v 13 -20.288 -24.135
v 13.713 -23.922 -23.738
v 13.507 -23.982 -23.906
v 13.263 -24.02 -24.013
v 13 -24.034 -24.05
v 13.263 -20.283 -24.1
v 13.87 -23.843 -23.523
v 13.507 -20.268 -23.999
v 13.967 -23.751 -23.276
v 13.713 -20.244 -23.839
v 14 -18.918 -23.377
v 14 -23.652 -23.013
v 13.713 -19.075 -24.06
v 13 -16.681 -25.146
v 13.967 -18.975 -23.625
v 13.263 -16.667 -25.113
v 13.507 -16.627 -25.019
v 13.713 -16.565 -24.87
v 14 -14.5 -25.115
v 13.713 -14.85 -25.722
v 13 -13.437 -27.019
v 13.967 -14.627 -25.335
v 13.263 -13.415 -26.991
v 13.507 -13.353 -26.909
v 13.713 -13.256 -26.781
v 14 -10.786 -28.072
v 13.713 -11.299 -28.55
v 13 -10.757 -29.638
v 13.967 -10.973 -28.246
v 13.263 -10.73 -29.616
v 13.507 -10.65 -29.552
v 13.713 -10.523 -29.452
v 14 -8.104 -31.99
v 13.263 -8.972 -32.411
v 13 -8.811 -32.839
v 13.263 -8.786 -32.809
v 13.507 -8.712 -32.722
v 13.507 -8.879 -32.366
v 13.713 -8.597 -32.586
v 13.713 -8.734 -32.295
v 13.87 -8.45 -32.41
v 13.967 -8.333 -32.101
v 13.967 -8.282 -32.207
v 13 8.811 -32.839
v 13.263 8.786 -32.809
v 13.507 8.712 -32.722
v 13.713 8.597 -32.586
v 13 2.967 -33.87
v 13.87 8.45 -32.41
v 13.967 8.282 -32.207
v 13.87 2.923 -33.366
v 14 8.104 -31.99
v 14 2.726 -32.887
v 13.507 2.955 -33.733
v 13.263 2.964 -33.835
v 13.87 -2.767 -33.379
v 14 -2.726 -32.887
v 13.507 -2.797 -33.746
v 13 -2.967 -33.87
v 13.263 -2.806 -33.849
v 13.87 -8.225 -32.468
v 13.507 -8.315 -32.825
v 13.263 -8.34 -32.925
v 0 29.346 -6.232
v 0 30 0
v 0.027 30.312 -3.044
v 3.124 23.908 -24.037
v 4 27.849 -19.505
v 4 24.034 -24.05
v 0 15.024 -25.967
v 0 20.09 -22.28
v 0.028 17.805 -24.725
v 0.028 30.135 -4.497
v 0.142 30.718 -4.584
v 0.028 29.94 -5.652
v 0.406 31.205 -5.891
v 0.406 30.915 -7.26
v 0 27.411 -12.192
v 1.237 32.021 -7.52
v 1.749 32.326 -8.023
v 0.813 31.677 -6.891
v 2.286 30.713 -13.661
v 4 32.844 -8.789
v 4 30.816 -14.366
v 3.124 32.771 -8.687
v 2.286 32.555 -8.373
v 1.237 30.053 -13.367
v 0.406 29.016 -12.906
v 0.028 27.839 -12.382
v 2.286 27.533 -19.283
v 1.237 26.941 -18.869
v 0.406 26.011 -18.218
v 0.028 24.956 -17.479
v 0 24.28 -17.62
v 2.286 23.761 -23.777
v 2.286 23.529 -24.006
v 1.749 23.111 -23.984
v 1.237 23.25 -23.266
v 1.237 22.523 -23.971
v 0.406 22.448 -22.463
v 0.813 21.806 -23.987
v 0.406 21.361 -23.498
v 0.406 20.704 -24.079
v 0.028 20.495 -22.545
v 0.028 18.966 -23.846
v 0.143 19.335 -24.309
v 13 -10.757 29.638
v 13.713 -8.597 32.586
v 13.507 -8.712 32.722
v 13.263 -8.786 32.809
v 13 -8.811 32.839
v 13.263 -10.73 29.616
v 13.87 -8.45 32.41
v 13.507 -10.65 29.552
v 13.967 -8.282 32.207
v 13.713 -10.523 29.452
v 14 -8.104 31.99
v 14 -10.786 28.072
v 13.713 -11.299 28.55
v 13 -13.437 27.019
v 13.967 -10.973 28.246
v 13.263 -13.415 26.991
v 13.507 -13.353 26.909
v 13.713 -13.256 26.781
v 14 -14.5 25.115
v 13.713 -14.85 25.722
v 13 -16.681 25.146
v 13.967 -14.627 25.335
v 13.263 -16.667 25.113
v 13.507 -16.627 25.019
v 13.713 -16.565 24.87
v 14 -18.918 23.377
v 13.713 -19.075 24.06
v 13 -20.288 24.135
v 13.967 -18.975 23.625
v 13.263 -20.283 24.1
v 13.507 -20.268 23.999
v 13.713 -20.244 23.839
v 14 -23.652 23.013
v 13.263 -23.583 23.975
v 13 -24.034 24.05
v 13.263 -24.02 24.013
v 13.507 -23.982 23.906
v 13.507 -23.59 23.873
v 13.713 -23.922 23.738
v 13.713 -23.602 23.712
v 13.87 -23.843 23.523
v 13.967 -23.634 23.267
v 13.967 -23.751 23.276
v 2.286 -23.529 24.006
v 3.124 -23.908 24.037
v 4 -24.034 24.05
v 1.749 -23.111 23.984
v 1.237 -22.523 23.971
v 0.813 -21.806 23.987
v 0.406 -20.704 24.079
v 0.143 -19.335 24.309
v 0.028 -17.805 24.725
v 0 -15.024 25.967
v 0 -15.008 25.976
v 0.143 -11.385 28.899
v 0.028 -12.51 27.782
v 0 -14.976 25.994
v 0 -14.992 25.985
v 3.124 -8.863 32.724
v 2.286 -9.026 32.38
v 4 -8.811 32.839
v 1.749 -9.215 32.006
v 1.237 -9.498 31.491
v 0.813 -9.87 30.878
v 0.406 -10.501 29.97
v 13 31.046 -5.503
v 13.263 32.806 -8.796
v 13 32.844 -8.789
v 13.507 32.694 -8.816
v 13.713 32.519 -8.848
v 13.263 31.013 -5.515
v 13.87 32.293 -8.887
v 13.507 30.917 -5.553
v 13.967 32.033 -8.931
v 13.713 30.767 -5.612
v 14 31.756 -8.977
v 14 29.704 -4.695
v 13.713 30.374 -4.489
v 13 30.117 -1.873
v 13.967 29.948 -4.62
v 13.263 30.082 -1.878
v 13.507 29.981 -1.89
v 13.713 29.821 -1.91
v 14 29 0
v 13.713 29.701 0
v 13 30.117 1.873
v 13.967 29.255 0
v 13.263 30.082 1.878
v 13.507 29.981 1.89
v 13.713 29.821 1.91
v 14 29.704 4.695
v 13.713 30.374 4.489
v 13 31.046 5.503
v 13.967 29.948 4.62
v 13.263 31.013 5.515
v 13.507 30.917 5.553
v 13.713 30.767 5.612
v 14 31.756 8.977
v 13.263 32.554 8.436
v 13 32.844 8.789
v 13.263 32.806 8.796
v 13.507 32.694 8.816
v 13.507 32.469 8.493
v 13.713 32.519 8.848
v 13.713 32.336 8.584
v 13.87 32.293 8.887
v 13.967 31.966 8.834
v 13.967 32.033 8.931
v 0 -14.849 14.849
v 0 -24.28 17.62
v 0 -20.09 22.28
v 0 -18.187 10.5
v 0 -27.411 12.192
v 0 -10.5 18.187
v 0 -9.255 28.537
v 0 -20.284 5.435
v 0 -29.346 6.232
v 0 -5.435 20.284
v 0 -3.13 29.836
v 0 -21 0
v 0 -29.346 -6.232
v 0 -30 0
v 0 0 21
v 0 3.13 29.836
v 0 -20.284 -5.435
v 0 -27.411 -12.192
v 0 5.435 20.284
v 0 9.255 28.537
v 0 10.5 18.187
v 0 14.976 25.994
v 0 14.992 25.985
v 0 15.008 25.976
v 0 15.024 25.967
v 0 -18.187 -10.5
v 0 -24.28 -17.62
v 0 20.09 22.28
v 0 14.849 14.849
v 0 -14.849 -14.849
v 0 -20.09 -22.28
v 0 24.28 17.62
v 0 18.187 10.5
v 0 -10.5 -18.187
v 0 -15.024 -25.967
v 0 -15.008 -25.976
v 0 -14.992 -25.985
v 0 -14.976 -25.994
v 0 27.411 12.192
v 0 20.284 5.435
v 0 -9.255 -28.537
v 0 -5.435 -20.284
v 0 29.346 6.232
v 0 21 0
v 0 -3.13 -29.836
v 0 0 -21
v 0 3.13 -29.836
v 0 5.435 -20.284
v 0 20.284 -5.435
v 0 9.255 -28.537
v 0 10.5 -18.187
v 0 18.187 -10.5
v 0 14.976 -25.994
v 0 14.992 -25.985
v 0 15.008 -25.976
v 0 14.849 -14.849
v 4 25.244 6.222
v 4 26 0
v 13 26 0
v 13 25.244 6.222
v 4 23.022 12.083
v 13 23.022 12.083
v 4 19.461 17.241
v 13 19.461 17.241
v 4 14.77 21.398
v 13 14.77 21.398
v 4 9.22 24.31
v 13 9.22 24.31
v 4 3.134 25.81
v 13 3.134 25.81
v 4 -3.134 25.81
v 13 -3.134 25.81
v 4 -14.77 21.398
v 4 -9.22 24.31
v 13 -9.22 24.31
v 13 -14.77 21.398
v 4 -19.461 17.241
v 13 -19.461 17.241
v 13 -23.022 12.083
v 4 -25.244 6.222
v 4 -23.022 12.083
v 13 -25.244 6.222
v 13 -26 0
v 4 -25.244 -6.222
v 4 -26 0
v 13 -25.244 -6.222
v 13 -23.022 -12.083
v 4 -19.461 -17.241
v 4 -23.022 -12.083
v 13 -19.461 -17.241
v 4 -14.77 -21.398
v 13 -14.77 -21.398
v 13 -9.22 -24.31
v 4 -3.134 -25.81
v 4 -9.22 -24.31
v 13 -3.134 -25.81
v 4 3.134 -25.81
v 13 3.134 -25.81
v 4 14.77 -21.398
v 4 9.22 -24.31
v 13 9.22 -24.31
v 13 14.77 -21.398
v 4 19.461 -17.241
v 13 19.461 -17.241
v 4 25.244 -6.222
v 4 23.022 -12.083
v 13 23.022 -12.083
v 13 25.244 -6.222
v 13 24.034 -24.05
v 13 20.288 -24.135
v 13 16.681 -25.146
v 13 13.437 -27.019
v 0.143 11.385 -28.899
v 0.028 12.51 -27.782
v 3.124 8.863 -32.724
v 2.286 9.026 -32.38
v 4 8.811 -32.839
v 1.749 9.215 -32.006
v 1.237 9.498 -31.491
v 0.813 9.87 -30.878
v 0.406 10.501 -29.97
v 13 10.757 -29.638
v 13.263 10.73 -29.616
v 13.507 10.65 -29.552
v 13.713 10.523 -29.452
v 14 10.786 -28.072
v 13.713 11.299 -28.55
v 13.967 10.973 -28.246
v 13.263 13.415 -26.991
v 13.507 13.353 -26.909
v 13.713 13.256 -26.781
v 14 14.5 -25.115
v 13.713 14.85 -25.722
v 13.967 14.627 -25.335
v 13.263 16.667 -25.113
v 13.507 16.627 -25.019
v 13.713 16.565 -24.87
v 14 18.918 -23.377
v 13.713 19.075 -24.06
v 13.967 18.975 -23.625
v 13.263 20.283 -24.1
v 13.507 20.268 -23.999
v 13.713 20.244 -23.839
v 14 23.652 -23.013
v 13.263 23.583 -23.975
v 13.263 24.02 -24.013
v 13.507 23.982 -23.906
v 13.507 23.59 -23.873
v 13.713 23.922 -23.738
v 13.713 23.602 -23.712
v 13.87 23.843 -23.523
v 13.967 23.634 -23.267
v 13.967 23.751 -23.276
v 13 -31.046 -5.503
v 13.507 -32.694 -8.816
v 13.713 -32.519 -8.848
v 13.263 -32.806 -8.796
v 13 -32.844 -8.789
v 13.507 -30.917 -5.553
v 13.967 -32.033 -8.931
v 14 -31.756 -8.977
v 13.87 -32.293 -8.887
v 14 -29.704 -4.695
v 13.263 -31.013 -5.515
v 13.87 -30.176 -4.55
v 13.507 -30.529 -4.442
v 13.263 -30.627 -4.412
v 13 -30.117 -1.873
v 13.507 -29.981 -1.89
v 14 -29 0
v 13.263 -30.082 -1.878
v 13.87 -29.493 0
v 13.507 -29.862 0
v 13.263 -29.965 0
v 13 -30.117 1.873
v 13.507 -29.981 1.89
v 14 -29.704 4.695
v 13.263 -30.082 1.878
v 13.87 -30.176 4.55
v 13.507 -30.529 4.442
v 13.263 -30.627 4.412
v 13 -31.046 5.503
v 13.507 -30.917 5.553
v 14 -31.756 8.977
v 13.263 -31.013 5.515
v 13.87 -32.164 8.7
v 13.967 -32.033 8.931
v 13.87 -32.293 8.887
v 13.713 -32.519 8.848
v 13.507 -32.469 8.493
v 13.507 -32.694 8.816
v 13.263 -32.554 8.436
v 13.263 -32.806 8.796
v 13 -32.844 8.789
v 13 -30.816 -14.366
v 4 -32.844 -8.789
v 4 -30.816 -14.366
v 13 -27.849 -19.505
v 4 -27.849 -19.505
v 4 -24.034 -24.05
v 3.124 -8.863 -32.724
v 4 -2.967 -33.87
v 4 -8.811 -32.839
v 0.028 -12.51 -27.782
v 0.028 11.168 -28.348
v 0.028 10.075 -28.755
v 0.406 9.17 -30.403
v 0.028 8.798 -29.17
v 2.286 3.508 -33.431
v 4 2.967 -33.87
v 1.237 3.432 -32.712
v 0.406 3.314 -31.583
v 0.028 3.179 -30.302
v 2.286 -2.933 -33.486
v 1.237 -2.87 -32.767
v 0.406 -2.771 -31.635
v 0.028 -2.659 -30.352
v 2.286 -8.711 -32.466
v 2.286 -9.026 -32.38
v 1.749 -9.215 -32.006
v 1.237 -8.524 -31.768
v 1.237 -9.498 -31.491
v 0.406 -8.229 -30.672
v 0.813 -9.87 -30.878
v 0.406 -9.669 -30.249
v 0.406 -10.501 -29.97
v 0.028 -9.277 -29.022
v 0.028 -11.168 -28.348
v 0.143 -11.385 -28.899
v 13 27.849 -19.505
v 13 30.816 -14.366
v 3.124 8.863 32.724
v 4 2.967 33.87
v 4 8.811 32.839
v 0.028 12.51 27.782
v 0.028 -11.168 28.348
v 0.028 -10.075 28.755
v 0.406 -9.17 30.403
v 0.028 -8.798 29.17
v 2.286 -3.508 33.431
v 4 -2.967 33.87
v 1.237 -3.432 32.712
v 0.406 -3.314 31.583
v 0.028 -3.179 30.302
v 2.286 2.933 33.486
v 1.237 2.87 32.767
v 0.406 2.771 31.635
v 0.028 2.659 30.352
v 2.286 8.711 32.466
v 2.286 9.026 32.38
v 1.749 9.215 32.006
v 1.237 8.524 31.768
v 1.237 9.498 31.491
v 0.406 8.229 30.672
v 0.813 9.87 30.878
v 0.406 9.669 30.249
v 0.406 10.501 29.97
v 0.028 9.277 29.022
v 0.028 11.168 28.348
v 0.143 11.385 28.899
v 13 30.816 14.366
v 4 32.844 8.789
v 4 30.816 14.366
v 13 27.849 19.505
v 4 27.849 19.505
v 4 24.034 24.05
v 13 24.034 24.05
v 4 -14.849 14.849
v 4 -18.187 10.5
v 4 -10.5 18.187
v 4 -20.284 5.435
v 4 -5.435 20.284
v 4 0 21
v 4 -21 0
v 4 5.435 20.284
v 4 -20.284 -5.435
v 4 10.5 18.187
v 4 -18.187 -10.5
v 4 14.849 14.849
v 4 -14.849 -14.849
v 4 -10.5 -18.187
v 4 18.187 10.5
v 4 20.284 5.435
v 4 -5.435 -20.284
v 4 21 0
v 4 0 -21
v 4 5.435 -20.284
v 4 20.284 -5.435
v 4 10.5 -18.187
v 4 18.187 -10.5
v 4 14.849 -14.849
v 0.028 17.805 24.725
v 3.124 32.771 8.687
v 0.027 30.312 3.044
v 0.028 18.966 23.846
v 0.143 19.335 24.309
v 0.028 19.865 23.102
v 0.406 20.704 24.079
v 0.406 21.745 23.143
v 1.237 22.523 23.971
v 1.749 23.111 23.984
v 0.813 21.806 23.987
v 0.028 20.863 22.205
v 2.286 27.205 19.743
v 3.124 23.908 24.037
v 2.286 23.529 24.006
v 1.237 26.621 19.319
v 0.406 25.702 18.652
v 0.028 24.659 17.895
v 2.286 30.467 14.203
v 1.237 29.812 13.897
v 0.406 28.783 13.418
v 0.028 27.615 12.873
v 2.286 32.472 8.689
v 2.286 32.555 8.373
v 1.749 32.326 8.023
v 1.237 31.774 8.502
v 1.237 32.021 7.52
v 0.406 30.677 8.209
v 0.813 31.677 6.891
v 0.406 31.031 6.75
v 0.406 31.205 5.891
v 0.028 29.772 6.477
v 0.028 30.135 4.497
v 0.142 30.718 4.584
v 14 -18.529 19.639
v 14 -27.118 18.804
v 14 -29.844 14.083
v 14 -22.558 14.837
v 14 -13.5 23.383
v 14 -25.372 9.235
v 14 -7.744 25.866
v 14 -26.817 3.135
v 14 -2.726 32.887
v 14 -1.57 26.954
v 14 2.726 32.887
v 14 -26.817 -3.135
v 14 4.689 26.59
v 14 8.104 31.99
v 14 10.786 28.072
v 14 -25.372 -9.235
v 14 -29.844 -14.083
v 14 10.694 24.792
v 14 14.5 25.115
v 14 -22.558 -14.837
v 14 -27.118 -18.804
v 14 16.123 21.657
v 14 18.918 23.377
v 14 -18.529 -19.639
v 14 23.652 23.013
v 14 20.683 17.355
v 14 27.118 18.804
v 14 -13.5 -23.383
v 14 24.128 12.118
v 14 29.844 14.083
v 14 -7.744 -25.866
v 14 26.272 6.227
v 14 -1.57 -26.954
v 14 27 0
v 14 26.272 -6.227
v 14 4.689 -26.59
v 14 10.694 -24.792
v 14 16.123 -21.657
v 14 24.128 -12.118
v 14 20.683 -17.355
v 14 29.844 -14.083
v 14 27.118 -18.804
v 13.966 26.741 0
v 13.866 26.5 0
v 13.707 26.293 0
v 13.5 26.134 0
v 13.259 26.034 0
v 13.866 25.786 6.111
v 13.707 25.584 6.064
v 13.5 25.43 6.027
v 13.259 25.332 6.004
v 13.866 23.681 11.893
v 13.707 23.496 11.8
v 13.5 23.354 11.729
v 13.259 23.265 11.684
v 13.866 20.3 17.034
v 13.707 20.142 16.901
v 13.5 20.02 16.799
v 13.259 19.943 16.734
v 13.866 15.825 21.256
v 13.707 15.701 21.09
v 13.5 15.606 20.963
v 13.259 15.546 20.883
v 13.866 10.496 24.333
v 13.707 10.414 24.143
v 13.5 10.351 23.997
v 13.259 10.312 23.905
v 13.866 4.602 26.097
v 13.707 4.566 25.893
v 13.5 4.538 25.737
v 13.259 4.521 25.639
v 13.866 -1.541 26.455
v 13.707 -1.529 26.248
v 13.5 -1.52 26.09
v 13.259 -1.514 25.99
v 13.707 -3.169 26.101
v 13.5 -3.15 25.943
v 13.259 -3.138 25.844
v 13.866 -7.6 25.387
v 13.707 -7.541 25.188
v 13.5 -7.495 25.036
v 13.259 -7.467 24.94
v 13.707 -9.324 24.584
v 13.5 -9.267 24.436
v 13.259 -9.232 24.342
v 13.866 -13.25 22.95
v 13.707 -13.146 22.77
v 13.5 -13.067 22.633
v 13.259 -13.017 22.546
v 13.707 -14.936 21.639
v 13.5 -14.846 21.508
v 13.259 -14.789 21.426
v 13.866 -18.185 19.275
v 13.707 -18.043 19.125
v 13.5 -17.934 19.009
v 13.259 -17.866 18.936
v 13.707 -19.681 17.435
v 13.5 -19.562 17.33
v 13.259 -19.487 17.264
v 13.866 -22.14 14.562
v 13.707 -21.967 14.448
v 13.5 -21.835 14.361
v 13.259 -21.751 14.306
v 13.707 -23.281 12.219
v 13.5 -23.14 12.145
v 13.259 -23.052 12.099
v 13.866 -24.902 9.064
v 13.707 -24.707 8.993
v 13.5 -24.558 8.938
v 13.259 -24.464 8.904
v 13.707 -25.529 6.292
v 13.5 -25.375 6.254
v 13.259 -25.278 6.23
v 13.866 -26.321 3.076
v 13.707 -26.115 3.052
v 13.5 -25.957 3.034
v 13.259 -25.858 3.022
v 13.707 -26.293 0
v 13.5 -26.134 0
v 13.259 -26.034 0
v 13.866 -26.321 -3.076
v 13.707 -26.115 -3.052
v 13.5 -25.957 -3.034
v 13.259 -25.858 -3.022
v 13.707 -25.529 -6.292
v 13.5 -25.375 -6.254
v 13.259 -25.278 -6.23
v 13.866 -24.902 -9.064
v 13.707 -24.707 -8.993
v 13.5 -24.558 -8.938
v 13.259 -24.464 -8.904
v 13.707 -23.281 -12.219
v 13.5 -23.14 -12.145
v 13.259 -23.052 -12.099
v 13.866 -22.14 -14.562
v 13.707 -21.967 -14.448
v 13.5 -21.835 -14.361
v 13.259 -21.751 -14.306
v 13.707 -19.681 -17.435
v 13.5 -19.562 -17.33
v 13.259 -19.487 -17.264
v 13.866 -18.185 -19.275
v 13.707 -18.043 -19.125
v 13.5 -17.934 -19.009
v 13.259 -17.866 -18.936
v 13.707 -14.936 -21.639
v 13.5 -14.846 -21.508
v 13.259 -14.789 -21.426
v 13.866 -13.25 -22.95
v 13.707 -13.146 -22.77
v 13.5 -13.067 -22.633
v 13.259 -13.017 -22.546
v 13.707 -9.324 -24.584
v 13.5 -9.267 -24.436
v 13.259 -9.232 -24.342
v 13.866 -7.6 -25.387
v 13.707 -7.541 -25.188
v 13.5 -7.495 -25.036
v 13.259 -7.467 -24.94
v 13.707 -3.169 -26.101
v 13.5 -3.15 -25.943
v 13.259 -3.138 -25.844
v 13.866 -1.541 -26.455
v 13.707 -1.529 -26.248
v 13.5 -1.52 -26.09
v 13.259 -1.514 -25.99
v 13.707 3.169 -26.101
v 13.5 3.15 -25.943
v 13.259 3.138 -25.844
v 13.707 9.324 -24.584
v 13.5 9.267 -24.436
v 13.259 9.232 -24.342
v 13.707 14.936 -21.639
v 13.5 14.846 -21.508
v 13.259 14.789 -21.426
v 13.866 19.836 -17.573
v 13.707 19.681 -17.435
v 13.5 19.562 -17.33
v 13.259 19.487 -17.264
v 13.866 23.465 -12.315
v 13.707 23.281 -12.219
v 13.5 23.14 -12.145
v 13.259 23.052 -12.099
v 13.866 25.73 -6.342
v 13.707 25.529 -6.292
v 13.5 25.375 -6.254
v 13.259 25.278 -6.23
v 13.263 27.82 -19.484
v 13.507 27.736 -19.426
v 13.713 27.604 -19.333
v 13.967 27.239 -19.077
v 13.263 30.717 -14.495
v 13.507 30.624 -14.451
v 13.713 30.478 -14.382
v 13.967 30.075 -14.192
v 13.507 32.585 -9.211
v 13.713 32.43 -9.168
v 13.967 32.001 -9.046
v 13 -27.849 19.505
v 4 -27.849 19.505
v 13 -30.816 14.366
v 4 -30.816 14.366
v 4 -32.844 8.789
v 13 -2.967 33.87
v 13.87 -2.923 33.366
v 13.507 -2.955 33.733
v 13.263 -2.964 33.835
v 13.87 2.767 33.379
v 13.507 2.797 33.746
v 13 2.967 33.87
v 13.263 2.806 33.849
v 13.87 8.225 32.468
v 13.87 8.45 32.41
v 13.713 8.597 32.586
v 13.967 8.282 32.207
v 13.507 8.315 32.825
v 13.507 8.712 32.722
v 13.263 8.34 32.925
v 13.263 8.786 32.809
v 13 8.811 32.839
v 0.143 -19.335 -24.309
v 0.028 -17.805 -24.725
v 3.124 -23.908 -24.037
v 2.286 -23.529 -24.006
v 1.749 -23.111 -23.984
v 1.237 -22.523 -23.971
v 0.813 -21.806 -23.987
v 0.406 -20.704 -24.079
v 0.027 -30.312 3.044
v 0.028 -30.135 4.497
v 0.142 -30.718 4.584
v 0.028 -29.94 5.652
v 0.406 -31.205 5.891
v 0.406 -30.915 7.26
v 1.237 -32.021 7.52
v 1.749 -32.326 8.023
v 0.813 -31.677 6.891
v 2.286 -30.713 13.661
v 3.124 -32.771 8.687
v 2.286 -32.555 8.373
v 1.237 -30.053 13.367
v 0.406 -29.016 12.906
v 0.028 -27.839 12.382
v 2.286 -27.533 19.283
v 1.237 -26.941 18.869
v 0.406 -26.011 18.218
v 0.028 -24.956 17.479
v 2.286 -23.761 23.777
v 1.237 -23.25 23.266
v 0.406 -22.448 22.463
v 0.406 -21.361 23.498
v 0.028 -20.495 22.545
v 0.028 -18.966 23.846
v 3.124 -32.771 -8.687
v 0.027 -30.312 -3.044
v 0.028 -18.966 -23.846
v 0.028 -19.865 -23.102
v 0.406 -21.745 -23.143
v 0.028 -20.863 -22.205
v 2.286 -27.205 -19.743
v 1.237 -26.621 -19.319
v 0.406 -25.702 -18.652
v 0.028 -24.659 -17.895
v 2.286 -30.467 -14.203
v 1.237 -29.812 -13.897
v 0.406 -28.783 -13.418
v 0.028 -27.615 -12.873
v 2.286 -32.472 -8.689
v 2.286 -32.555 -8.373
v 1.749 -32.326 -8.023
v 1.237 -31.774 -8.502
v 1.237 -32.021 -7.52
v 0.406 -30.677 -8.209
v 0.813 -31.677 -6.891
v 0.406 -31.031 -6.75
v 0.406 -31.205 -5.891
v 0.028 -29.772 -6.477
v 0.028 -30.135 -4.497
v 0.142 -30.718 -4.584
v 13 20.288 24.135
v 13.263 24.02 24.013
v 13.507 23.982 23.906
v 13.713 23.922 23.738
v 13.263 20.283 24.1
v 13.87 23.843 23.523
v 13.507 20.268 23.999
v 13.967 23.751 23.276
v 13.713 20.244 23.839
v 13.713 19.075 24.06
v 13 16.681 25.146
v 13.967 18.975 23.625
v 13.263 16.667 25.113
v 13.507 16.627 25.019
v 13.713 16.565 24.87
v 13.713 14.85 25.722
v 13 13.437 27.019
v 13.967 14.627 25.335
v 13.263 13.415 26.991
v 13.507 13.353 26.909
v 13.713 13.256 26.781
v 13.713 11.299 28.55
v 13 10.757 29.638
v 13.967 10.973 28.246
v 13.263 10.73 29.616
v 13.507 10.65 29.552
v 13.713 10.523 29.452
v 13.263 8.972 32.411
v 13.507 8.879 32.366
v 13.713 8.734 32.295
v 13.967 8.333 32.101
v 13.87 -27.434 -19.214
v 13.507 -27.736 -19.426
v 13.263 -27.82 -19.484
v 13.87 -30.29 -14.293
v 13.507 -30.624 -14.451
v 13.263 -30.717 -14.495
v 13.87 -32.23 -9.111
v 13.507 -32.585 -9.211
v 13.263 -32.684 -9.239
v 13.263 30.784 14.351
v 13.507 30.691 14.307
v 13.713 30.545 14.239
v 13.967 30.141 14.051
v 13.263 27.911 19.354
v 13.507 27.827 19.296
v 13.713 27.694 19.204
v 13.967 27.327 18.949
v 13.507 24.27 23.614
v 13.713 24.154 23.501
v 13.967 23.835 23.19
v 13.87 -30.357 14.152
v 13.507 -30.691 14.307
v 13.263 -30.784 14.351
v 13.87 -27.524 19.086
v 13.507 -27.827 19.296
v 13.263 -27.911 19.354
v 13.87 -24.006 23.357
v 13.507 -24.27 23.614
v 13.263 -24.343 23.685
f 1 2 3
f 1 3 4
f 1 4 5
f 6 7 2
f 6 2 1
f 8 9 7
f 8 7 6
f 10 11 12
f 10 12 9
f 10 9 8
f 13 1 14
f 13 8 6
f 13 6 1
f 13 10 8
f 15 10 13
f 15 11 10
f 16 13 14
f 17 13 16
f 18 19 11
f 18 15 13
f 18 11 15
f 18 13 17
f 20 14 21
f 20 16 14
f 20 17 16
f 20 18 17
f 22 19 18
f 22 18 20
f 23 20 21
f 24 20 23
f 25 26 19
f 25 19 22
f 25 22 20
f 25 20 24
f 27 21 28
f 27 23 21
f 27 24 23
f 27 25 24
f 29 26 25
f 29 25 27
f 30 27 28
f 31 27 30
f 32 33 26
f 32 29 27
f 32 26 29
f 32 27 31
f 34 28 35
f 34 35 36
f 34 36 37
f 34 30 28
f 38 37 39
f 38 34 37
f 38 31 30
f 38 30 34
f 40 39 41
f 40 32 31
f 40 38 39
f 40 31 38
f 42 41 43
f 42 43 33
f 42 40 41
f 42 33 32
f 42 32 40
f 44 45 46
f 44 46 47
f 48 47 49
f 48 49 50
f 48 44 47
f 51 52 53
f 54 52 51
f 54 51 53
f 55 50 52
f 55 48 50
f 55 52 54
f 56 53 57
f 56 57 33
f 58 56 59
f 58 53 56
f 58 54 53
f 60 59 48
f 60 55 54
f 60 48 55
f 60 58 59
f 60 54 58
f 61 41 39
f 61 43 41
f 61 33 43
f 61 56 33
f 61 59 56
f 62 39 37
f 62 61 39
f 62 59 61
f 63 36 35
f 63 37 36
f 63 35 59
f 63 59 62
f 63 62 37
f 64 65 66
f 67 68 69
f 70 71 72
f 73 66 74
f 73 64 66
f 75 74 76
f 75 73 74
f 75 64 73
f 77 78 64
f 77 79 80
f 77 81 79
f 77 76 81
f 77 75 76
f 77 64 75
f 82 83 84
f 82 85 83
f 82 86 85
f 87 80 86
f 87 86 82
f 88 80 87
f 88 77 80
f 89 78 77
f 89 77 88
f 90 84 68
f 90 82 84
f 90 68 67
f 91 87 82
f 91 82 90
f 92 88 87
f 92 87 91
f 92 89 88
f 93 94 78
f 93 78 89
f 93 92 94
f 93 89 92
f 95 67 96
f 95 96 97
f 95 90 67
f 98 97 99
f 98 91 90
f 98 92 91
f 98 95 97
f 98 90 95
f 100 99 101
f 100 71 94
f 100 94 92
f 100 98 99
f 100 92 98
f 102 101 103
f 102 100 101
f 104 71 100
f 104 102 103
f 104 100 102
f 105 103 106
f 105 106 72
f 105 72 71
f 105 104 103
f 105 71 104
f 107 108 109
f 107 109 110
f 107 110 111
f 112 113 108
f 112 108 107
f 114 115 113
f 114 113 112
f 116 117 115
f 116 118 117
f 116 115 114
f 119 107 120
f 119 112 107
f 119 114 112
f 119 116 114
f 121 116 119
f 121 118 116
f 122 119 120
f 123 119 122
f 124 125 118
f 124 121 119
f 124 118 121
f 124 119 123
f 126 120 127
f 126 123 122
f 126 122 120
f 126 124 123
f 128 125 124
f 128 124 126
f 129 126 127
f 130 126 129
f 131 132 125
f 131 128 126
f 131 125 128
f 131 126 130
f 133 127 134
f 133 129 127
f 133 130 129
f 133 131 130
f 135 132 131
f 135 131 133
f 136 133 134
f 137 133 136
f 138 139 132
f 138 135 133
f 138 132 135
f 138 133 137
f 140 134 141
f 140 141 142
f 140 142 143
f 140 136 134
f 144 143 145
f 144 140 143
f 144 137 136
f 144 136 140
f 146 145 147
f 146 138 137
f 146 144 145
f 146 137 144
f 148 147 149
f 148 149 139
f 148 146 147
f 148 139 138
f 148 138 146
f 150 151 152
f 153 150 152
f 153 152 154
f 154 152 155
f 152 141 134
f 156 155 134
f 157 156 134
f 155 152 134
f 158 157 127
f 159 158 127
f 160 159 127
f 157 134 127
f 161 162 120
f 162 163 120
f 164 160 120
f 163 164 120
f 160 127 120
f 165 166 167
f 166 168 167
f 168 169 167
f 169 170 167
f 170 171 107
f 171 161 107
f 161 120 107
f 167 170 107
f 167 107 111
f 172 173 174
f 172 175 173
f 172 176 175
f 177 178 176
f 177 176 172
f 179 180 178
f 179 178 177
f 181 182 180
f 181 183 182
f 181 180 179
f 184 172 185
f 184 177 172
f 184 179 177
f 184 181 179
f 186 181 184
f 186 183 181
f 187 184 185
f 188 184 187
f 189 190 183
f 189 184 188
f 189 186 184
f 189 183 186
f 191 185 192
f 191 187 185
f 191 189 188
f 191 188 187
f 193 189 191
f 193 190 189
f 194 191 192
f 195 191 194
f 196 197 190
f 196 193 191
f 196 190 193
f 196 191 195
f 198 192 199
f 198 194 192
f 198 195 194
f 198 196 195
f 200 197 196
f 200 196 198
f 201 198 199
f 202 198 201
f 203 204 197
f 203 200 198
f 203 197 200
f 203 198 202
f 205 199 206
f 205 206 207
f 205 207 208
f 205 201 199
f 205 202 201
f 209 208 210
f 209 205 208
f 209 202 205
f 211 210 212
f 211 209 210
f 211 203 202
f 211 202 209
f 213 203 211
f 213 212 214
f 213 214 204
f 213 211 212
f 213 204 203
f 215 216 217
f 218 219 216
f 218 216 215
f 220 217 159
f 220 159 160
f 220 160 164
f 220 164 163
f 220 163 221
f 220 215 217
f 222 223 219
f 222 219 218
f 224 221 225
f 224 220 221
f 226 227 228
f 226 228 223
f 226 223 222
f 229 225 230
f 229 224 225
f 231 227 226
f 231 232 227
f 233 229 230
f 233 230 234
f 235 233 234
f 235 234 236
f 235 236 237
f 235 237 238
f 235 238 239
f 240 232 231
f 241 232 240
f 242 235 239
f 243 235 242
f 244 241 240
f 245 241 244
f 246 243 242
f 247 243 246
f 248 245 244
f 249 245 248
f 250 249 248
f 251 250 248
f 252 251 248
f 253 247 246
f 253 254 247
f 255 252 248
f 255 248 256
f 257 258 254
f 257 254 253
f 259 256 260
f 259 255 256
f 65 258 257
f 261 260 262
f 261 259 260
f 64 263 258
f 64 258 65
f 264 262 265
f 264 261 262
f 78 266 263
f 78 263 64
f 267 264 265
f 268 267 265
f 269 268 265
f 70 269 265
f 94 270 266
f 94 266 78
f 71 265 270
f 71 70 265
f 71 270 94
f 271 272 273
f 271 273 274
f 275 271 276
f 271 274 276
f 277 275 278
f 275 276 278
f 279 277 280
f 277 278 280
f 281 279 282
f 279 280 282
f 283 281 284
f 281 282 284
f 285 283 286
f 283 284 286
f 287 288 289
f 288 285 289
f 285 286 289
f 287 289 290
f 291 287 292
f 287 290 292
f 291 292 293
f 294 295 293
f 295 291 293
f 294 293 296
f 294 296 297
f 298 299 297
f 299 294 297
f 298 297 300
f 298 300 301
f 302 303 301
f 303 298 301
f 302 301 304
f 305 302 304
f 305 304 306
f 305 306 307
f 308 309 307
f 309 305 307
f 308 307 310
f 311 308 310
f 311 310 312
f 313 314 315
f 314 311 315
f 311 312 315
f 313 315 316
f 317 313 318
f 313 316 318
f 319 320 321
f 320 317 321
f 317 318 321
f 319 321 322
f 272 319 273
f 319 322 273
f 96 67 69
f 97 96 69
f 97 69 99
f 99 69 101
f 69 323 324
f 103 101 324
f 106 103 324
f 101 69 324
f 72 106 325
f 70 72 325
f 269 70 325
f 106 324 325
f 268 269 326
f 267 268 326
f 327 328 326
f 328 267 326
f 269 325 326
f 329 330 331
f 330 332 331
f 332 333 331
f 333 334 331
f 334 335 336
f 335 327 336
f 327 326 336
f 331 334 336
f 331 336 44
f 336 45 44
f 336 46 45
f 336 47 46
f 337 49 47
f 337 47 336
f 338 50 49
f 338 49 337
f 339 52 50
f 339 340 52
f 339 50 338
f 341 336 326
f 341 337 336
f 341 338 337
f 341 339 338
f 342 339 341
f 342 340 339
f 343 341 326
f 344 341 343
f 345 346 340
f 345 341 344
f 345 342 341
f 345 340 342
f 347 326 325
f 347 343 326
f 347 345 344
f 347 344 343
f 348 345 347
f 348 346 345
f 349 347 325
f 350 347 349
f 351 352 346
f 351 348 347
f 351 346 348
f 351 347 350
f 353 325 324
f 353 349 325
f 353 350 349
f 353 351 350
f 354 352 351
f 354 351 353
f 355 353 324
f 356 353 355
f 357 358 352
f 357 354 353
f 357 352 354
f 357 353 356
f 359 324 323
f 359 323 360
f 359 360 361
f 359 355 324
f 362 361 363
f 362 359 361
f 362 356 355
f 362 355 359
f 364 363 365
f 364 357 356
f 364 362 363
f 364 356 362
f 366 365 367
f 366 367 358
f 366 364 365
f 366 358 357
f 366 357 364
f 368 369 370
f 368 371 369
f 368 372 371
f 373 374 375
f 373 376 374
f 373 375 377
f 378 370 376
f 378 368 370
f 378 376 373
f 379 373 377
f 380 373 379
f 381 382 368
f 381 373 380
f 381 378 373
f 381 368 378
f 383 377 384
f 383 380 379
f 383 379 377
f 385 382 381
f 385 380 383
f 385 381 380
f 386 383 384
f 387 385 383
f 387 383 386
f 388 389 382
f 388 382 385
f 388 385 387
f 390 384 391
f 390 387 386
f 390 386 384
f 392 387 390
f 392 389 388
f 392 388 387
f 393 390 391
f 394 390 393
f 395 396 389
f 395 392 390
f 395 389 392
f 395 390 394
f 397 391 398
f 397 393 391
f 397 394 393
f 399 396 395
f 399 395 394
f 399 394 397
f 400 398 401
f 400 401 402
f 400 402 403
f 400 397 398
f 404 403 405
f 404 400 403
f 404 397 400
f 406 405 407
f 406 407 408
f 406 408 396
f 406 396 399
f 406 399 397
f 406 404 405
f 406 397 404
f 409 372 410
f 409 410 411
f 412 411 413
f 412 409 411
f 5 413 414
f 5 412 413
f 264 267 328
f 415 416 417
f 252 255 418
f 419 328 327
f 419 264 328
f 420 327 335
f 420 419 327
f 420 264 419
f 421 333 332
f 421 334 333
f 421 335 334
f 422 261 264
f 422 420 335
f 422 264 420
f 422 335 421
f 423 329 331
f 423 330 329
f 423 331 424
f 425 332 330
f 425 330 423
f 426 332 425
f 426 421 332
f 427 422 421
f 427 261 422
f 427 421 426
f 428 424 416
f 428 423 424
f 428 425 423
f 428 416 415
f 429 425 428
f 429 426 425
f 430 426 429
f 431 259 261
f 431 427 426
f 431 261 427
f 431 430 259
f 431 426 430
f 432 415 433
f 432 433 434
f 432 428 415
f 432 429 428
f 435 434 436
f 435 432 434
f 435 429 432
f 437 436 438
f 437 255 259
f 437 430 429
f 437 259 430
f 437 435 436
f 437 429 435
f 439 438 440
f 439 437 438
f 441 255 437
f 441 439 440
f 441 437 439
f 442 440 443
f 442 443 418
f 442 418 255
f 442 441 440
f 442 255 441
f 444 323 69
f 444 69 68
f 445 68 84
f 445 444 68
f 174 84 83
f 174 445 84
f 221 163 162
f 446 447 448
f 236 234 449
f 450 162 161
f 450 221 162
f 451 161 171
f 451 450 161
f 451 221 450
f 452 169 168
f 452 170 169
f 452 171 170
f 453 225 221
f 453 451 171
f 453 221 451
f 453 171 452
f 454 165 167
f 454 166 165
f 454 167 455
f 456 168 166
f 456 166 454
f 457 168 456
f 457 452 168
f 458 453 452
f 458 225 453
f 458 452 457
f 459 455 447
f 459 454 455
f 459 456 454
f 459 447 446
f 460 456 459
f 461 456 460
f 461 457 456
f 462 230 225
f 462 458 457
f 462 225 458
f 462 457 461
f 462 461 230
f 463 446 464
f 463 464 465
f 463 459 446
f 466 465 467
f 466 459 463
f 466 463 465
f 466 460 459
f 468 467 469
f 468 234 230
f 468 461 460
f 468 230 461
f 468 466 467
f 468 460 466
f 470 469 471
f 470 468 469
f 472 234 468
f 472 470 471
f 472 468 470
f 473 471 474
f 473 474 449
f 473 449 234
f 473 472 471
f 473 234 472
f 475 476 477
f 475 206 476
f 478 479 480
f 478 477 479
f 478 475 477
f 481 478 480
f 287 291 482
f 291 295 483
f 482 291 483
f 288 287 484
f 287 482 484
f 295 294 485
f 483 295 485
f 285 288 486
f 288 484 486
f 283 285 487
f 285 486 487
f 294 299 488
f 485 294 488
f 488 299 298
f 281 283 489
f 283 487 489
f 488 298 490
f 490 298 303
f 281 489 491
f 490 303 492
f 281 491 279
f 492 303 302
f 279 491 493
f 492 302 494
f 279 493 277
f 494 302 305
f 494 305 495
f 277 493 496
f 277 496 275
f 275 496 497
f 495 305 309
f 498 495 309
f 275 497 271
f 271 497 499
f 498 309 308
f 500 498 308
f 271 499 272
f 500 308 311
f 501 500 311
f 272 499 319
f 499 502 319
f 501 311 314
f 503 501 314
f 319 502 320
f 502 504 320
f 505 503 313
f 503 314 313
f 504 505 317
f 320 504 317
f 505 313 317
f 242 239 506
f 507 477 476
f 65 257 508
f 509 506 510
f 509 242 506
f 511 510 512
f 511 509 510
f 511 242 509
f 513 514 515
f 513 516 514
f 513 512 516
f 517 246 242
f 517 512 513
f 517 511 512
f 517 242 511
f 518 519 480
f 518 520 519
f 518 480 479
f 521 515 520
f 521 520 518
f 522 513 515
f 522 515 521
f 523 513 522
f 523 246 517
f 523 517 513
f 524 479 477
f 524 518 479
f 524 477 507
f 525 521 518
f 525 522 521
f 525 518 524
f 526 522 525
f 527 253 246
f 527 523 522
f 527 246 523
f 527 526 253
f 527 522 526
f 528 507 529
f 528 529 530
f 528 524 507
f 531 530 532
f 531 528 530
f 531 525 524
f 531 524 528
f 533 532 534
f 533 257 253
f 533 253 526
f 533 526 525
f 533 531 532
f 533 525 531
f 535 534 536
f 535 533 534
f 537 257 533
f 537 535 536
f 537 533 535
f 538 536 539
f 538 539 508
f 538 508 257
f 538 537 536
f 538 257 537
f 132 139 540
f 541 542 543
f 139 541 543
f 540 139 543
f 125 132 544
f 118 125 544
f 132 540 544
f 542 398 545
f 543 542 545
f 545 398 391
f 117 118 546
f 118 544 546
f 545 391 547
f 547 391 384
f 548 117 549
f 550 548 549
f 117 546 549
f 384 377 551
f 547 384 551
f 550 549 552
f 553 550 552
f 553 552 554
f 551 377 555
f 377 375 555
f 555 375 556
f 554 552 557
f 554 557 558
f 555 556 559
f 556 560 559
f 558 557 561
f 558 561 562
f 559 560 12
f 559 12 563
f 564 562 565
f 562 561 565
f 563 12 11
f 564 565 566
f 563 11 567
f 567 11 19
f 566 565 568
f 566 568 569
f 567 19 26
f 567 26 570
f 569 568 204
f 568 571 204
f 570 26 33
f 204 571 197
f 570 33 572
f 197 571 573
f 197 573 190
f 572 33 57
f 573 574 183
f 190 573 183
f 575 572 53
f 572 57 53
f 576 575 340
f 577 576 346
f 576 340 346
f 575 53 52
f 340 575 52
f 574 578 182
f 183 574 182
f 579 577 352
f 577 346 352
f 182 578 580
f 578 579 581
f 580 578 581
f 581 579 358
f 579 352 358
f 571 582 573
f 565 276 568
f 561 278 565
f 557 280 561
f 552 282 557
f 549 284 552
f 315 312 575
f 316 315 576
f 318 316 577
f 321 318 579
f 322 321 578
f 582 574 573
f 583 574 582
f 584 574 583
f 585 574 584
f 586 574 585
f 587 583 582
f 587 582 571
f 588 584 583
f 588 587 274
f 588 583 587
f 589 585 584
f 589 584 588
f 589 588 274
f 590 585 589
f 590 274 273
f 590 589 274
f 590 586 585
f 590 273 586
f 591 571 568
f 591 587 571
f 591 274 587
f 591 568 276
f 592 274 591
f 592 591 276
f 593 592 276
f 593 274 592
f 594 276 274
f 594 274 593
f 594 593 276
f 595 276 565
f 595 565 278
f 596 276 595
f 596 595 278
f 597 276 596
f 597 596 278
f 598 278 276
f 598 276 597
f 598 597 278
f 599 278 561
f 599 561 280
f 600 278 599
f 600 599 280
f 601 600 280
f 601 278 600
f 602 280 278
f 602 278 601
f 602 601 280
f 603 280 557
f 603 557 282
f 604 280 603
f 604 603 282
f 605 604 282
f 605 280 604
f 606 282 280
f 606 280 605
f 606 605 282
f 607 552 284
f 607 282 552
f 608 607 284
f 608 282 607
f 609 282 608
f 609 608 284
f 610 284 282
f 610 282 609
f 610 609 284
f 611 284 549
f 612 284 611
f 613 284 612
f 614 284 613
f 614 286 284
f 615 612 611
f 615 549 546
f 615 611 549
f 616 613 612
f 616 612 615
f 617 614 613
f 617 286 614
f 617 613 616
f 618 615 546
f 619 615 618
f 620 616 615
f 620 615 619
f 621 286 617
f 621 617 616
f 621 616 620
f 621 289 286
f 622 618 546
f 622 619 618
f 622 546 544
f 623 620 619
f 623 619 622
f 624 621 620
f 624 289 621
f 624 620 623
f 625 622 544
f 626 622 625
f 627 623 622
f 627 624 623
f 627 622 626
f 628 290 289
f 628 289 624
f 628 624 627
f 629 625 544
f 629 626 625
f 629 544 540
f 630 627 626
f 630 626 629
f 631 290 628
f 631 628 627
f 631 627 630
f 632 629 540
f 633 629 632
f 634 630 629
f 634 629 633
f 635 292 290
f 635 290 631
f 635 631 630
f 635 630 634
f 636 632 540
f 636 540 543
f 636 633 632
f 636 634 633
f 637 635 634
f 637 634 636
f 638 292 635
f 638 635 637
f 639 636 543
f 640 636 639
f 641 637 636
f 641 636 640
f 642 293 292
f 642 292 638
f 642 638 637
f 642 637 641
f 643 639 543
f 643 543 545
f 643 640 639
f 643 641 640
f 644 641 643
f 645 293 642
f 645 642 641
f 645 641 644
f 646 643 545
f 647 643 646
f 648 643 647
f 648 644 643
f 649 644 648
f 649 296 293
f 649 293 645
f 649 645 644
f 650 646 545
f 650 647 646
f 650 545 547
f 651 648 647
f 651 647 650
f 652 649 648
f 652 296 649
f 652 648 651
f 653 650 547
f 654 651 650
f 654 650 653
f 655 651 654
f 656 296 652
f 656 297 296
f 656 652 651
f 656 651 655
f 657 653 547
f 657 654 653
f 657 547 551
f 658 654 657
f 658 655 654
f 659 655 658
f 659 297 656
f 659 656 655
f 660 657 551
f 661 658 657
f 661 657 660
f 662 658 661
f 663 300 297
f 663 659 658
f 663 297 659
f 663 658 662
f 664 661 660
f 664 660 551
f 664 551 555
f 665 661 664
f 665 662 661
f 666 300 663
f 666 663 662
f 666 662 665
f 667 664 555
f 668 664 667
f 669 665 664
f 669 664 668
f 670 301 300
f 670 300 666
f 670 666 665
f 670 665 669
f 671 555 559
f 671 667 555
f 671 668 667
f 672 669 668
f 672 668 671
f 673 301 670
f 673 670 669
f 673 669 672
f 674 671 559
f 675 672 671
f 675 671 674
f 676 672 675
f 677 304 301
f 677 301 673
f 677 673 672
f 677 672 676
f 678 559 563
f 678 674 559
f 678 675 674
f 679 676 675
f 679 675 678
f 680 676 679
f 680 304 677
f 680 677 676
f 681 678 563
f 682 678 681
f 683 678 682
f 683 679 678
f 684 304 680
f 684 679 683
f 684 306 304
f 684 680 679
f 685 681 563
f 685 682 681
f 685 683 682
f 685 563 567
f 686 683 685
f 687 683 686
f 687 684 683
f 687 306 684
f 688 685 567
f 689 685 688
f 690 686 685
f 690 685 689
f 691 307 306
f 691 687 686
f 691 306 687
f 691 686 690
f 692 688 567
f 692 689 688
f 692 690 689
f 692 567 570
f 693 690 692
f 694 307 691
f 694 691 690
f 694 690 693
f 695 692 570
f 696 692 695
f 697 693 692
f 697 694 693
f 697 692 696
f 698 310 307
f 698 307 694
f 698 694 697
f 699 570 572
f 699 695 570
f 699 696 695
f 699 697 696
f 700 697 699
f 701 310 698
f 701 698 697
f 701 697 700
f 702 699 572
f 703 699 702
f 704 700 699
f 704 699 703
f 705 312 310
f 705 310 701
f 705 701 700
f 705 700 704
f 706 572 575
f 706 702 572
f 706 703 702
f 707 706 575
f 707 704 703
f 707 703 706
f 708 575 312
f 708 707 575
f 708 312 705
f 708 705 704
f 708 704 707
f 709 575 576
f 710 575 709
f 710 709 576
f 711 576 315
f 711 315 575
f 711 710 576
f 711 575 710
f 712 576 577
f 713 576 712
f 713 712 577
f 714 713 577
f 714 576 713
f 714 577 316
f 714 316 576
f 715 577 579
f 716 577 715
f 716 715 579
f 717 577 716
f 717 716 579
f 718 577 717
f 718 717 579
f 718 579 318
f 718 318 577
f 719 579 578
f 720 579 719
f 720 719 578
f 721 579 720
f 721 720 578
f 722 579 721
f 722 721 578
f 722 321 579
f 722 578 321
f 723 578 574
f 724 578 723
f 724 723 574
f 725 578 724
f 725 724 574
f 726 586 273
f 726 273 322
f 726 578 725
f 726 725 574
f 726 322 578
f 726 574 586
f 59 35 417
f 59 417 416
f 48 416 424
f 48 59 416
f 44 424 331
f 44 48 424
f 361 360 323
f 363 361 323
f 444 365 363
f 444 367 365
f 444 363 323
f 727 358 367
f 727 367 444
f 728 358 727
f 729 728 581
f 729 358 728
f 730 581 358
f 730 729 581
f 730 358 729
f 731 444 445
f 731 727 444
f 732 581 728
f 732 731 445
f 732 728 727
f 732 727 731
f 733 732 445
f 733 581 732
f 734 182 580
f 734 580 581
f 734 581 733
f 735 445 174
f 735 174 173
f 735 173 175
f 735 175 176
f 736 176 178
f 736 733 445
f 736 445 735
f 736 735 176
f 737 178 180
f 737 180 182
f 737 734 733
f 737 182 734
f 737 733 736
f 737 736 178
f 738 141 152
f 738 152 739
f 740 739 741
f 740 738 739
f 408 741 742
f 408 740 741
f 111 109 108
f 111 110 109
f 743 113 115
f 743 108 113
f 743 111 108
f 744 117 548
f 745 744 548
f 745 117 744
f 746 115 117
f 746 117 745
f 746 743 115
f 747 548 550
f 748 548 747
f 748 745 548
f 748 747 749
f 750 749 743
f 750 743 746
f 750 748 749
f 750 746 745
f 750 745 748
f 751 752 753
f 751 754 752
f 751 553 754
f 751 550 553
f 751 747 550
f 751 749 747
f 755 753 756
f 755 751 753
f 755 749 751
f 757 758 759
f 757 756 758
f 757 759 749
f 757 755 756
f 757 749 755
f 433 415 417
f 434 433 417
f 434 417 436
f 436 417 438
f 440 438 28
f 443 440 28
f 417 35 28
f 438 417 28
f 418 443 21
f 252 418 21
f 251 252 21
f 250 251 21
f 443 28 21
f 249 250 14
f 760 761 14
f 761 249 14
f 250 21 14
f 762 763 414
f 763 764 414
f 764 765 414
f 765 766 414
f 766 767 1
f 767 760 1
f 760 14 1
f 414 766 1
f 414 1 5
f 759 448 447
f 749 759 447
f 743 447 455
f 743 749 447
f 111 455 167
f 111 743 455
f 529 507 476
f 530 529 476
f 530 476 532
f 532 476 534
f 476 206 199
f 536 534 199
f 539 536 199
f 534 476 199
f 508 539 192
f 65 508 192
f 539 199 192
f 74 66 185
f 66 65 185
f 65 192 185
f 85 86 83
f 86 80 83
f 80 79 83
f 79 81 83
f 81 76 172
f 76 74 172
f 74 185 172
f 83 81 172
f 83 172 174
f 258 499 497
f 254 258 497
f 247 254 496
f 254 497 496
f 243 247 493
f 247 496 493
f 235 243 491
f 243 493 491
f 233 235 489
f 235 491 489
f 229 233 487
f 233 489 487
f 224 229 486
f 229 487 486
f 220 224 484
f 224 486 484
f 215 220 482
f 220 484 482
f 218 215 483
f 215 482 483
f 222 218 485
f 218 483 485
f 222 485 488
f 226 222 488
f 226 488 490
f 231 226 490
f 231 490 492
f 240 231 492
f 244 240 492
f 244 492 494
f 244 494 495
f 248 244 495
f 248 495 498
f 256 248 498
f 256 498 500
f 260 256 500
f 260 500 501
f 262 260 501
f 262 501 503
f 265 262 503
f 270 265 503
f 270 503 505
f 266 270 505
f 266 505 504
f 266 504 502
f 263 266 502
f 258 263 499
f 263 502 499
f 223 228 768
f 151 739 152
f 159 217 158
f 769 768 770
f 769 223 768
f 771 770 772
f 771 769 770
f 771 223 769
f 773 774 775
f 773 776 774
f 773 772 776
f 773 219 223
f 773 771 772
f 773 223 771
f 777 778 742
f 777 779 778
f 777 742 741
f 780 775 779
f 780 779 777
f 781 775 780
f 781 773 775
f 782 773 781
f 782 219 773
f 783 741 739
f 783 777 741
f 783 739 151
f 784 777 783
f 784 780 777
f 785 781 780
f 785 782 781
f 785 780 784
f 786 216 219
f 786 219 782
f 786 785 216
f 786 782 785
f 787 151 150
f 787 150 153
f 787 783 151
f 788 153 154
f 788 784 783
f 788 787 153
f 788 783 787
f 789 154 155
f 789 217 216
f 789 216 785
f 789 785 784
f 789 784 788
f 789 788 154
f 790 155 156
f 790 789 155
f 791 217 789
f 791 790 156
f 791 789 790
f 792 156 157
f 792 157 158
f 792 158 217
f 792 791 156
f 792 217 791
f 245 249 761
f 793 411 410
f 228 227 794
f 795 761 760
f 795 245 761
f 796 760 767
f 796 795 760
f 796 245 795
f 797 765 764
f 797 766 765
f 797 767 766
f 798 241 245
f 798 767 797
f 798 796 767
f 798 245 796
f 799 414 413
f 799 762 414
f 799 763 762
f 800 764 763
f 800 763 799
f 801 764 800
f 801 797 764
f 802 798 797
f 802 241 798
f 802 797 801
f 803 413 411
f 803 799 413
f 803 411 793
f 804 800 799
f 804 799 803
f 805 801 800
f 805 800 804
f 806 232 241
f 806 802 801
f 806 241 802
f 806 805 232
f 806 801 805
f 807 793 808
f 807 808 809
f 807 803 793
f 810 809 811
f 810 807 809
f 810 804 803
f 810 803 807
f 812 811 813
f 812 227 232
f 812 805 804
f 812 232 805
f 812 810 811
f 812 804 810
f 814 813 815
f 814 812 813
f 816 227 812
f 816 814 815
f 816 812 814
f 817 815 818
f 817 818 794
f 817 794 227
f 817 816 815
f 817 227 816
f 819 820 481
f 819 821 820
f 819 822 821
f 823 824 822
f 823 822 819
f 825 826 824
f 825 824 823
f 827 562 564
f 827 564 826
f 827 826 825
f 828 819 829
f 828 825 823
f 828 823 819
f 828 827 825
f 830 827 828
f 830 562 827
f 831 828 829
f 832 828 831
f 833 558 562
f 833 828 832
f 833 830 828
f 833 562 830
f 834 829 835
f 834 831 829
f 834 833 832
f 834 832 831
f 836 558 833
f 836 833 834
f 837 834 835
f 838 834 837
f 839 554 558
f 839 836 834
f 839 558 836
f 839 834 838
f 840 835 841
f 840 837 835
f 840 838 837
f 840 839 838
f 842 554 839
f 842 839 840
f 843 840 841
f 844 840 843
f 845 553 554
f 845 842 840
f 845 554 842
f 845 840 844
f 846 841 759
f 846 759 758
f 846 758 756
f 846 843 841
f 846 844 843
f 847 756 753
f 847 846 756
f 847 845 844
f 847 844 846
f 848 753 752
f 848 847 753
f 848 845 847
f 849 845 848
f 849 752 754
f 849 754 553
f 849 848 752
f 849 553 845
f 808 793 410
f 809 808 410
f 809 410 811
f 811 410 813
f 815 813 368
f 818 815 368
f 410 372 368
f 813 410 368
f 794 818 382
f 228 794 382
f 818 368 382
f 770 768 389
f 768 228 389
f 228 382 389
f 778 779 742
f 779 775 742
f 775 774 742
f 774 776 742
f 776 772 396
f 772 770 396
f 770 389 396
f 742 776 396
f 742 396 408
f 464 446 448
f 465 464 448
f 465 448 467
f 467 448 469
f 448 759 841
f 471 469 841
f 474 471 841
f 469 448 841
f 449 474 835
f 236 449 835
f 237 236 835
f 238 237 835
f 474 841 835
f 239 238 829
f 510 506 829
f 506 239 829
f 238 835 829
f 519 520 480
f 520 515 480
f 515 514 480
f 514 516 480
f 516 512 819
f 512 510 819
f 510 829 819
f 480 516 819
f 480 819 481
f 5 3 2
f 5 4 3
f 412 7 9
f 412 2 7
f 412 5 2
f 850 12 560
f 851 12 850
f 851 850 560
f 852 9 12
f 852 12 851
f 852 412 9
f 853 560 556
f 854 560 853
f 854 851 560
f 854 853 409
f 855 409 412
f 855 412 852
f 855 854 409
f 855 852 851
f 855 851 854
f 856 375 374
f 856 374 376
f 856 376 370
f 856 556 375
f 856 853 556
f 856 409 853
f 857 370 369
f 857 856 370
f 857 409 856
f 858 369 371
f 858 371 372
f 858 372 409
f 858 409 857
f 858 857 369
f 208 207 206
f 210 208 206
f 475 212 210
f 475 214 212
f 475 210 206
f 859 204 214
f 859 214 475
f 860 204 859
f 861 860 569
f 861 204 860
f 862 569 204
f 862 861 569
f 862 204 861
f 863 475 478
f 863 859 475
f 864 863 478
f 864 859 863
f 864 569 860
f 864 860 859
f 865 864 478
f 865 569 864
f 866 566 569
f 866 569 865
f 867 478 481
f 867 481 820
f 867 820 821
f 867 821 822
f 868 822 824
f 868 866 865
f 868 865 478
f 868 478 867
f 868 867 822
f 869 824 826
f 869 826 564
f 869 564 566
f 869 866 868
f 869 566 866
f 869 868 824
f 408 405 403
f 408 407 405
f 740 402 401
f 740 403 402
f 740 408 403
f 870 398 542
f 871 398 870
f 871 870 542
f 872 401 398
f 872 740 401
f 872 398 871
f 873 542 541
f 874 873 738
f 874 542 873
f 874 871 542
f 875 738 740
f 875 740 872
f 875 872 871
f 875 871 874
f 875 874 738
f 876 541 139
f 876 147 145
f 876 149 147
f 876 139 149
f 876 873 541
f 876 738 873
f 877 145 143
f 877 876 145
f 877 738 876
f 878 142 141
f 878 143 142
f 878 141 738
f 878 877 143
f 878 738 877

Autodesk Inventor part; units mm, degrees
ref_plane "XZ Plane" through (0, 0, 0) normal (0, 1, 0) x (-1, 0, 0)
ref_plane "XY Plane" through (0, 0, 0) normal (0, 0, 1) x (1, 0, 0)
sketch "Эскиз1" plane through (0, 0, 0) normal (0, 0, 1) x (1, 0, 0)
  line L0 (0, 0) -> (0, 30)
  line L1 (4, 34) -> (14, 34)
  line L2 (14, 34) -> (14, 26)
  line L3 (4, 0) -> (0, 0)
  arc A0 (4, 34) -> (0, 30) centre (4, 30) ccw
  line L4 (4, 0) -> (4, 26)
  line L5 (4, 26) -> (14, 26)
  dimension "d3" = 4
  dimension "d4" = 30
  dimension "d5" = 8
  dimension "d6" = 4
  dimension "d7" = 10
  dimension "d8" = 26
revolve "Вращение1" add sketch "Эскиз1" angle 360 about axis through (4, 0, 0) along (-1, 0, 0)
ref_plane "РабПлоскость1" through (7, 0, 0) normal (1, 0, 0) x (0, 1, 0)
sketch "Эскиз4" plane through (7, 0, 0) normal (1, 0, 0) x (0, 1, 0)
  circle A0 centre (0, 0) radius 45
  circle A1 centre (45, 0) radius 15
  circle A2 centre (22.5, 38.9711) radius 15
  circle A3 centre (-22.5, 38.9711) radius 15
  circle A4 centre (-45, 0) radius 15
  circle A5 centre (-22.5, -38.9711) radius 15
  circle A6 centre (22.5, -38.9711) radius 15
  dimension "d10" = 90
  dimension "d11" = 30
  dimension "d14" = 360
extrude "Выдавливание1" cut sketch "Эскиз4" along normal through all both and the other way through all contours A0 A1 | A0 A1 | A2 A0 | A0 A2 | A6 A0 | A0 A6 | A3 A0 | A0 A3 | A5 A0 | A0 A5 | A4 A0 | A0 A4
sketch "Эскиз5" plane through (7, 0, 0) normal (1, 0, 0) x (0, 1, 0)
  circle A0 centre (0, 0) radius 21
  dimension "d18" = 42
extrude "Выдавливание2" cut sketch "Эскиз5" along normal through all both and the other way through all
thread "Резьба1" size "M52x5" class "6H" standard "ISO Metric profile" full length
thread "Резьба2" size "M52x5" class "6H" standard "ANSI Metric M Profile" full length
fillet "Сопряжение1" radius 1 13 edges at (14, 15, -25.9808) (14, 29.4449, -17) (14, 30, 0) (14, 29.4449, 17) (14, 15, 25.9808) (14, 0, 34) (14, -15, 25.9808) (14, -29.4449, 17) (14, -30, 0) (14, -29.4449, -17) (14, -15, -25.9808) (14, 0, -34) (14, -26, 0)
properties part number "Крышка М"
